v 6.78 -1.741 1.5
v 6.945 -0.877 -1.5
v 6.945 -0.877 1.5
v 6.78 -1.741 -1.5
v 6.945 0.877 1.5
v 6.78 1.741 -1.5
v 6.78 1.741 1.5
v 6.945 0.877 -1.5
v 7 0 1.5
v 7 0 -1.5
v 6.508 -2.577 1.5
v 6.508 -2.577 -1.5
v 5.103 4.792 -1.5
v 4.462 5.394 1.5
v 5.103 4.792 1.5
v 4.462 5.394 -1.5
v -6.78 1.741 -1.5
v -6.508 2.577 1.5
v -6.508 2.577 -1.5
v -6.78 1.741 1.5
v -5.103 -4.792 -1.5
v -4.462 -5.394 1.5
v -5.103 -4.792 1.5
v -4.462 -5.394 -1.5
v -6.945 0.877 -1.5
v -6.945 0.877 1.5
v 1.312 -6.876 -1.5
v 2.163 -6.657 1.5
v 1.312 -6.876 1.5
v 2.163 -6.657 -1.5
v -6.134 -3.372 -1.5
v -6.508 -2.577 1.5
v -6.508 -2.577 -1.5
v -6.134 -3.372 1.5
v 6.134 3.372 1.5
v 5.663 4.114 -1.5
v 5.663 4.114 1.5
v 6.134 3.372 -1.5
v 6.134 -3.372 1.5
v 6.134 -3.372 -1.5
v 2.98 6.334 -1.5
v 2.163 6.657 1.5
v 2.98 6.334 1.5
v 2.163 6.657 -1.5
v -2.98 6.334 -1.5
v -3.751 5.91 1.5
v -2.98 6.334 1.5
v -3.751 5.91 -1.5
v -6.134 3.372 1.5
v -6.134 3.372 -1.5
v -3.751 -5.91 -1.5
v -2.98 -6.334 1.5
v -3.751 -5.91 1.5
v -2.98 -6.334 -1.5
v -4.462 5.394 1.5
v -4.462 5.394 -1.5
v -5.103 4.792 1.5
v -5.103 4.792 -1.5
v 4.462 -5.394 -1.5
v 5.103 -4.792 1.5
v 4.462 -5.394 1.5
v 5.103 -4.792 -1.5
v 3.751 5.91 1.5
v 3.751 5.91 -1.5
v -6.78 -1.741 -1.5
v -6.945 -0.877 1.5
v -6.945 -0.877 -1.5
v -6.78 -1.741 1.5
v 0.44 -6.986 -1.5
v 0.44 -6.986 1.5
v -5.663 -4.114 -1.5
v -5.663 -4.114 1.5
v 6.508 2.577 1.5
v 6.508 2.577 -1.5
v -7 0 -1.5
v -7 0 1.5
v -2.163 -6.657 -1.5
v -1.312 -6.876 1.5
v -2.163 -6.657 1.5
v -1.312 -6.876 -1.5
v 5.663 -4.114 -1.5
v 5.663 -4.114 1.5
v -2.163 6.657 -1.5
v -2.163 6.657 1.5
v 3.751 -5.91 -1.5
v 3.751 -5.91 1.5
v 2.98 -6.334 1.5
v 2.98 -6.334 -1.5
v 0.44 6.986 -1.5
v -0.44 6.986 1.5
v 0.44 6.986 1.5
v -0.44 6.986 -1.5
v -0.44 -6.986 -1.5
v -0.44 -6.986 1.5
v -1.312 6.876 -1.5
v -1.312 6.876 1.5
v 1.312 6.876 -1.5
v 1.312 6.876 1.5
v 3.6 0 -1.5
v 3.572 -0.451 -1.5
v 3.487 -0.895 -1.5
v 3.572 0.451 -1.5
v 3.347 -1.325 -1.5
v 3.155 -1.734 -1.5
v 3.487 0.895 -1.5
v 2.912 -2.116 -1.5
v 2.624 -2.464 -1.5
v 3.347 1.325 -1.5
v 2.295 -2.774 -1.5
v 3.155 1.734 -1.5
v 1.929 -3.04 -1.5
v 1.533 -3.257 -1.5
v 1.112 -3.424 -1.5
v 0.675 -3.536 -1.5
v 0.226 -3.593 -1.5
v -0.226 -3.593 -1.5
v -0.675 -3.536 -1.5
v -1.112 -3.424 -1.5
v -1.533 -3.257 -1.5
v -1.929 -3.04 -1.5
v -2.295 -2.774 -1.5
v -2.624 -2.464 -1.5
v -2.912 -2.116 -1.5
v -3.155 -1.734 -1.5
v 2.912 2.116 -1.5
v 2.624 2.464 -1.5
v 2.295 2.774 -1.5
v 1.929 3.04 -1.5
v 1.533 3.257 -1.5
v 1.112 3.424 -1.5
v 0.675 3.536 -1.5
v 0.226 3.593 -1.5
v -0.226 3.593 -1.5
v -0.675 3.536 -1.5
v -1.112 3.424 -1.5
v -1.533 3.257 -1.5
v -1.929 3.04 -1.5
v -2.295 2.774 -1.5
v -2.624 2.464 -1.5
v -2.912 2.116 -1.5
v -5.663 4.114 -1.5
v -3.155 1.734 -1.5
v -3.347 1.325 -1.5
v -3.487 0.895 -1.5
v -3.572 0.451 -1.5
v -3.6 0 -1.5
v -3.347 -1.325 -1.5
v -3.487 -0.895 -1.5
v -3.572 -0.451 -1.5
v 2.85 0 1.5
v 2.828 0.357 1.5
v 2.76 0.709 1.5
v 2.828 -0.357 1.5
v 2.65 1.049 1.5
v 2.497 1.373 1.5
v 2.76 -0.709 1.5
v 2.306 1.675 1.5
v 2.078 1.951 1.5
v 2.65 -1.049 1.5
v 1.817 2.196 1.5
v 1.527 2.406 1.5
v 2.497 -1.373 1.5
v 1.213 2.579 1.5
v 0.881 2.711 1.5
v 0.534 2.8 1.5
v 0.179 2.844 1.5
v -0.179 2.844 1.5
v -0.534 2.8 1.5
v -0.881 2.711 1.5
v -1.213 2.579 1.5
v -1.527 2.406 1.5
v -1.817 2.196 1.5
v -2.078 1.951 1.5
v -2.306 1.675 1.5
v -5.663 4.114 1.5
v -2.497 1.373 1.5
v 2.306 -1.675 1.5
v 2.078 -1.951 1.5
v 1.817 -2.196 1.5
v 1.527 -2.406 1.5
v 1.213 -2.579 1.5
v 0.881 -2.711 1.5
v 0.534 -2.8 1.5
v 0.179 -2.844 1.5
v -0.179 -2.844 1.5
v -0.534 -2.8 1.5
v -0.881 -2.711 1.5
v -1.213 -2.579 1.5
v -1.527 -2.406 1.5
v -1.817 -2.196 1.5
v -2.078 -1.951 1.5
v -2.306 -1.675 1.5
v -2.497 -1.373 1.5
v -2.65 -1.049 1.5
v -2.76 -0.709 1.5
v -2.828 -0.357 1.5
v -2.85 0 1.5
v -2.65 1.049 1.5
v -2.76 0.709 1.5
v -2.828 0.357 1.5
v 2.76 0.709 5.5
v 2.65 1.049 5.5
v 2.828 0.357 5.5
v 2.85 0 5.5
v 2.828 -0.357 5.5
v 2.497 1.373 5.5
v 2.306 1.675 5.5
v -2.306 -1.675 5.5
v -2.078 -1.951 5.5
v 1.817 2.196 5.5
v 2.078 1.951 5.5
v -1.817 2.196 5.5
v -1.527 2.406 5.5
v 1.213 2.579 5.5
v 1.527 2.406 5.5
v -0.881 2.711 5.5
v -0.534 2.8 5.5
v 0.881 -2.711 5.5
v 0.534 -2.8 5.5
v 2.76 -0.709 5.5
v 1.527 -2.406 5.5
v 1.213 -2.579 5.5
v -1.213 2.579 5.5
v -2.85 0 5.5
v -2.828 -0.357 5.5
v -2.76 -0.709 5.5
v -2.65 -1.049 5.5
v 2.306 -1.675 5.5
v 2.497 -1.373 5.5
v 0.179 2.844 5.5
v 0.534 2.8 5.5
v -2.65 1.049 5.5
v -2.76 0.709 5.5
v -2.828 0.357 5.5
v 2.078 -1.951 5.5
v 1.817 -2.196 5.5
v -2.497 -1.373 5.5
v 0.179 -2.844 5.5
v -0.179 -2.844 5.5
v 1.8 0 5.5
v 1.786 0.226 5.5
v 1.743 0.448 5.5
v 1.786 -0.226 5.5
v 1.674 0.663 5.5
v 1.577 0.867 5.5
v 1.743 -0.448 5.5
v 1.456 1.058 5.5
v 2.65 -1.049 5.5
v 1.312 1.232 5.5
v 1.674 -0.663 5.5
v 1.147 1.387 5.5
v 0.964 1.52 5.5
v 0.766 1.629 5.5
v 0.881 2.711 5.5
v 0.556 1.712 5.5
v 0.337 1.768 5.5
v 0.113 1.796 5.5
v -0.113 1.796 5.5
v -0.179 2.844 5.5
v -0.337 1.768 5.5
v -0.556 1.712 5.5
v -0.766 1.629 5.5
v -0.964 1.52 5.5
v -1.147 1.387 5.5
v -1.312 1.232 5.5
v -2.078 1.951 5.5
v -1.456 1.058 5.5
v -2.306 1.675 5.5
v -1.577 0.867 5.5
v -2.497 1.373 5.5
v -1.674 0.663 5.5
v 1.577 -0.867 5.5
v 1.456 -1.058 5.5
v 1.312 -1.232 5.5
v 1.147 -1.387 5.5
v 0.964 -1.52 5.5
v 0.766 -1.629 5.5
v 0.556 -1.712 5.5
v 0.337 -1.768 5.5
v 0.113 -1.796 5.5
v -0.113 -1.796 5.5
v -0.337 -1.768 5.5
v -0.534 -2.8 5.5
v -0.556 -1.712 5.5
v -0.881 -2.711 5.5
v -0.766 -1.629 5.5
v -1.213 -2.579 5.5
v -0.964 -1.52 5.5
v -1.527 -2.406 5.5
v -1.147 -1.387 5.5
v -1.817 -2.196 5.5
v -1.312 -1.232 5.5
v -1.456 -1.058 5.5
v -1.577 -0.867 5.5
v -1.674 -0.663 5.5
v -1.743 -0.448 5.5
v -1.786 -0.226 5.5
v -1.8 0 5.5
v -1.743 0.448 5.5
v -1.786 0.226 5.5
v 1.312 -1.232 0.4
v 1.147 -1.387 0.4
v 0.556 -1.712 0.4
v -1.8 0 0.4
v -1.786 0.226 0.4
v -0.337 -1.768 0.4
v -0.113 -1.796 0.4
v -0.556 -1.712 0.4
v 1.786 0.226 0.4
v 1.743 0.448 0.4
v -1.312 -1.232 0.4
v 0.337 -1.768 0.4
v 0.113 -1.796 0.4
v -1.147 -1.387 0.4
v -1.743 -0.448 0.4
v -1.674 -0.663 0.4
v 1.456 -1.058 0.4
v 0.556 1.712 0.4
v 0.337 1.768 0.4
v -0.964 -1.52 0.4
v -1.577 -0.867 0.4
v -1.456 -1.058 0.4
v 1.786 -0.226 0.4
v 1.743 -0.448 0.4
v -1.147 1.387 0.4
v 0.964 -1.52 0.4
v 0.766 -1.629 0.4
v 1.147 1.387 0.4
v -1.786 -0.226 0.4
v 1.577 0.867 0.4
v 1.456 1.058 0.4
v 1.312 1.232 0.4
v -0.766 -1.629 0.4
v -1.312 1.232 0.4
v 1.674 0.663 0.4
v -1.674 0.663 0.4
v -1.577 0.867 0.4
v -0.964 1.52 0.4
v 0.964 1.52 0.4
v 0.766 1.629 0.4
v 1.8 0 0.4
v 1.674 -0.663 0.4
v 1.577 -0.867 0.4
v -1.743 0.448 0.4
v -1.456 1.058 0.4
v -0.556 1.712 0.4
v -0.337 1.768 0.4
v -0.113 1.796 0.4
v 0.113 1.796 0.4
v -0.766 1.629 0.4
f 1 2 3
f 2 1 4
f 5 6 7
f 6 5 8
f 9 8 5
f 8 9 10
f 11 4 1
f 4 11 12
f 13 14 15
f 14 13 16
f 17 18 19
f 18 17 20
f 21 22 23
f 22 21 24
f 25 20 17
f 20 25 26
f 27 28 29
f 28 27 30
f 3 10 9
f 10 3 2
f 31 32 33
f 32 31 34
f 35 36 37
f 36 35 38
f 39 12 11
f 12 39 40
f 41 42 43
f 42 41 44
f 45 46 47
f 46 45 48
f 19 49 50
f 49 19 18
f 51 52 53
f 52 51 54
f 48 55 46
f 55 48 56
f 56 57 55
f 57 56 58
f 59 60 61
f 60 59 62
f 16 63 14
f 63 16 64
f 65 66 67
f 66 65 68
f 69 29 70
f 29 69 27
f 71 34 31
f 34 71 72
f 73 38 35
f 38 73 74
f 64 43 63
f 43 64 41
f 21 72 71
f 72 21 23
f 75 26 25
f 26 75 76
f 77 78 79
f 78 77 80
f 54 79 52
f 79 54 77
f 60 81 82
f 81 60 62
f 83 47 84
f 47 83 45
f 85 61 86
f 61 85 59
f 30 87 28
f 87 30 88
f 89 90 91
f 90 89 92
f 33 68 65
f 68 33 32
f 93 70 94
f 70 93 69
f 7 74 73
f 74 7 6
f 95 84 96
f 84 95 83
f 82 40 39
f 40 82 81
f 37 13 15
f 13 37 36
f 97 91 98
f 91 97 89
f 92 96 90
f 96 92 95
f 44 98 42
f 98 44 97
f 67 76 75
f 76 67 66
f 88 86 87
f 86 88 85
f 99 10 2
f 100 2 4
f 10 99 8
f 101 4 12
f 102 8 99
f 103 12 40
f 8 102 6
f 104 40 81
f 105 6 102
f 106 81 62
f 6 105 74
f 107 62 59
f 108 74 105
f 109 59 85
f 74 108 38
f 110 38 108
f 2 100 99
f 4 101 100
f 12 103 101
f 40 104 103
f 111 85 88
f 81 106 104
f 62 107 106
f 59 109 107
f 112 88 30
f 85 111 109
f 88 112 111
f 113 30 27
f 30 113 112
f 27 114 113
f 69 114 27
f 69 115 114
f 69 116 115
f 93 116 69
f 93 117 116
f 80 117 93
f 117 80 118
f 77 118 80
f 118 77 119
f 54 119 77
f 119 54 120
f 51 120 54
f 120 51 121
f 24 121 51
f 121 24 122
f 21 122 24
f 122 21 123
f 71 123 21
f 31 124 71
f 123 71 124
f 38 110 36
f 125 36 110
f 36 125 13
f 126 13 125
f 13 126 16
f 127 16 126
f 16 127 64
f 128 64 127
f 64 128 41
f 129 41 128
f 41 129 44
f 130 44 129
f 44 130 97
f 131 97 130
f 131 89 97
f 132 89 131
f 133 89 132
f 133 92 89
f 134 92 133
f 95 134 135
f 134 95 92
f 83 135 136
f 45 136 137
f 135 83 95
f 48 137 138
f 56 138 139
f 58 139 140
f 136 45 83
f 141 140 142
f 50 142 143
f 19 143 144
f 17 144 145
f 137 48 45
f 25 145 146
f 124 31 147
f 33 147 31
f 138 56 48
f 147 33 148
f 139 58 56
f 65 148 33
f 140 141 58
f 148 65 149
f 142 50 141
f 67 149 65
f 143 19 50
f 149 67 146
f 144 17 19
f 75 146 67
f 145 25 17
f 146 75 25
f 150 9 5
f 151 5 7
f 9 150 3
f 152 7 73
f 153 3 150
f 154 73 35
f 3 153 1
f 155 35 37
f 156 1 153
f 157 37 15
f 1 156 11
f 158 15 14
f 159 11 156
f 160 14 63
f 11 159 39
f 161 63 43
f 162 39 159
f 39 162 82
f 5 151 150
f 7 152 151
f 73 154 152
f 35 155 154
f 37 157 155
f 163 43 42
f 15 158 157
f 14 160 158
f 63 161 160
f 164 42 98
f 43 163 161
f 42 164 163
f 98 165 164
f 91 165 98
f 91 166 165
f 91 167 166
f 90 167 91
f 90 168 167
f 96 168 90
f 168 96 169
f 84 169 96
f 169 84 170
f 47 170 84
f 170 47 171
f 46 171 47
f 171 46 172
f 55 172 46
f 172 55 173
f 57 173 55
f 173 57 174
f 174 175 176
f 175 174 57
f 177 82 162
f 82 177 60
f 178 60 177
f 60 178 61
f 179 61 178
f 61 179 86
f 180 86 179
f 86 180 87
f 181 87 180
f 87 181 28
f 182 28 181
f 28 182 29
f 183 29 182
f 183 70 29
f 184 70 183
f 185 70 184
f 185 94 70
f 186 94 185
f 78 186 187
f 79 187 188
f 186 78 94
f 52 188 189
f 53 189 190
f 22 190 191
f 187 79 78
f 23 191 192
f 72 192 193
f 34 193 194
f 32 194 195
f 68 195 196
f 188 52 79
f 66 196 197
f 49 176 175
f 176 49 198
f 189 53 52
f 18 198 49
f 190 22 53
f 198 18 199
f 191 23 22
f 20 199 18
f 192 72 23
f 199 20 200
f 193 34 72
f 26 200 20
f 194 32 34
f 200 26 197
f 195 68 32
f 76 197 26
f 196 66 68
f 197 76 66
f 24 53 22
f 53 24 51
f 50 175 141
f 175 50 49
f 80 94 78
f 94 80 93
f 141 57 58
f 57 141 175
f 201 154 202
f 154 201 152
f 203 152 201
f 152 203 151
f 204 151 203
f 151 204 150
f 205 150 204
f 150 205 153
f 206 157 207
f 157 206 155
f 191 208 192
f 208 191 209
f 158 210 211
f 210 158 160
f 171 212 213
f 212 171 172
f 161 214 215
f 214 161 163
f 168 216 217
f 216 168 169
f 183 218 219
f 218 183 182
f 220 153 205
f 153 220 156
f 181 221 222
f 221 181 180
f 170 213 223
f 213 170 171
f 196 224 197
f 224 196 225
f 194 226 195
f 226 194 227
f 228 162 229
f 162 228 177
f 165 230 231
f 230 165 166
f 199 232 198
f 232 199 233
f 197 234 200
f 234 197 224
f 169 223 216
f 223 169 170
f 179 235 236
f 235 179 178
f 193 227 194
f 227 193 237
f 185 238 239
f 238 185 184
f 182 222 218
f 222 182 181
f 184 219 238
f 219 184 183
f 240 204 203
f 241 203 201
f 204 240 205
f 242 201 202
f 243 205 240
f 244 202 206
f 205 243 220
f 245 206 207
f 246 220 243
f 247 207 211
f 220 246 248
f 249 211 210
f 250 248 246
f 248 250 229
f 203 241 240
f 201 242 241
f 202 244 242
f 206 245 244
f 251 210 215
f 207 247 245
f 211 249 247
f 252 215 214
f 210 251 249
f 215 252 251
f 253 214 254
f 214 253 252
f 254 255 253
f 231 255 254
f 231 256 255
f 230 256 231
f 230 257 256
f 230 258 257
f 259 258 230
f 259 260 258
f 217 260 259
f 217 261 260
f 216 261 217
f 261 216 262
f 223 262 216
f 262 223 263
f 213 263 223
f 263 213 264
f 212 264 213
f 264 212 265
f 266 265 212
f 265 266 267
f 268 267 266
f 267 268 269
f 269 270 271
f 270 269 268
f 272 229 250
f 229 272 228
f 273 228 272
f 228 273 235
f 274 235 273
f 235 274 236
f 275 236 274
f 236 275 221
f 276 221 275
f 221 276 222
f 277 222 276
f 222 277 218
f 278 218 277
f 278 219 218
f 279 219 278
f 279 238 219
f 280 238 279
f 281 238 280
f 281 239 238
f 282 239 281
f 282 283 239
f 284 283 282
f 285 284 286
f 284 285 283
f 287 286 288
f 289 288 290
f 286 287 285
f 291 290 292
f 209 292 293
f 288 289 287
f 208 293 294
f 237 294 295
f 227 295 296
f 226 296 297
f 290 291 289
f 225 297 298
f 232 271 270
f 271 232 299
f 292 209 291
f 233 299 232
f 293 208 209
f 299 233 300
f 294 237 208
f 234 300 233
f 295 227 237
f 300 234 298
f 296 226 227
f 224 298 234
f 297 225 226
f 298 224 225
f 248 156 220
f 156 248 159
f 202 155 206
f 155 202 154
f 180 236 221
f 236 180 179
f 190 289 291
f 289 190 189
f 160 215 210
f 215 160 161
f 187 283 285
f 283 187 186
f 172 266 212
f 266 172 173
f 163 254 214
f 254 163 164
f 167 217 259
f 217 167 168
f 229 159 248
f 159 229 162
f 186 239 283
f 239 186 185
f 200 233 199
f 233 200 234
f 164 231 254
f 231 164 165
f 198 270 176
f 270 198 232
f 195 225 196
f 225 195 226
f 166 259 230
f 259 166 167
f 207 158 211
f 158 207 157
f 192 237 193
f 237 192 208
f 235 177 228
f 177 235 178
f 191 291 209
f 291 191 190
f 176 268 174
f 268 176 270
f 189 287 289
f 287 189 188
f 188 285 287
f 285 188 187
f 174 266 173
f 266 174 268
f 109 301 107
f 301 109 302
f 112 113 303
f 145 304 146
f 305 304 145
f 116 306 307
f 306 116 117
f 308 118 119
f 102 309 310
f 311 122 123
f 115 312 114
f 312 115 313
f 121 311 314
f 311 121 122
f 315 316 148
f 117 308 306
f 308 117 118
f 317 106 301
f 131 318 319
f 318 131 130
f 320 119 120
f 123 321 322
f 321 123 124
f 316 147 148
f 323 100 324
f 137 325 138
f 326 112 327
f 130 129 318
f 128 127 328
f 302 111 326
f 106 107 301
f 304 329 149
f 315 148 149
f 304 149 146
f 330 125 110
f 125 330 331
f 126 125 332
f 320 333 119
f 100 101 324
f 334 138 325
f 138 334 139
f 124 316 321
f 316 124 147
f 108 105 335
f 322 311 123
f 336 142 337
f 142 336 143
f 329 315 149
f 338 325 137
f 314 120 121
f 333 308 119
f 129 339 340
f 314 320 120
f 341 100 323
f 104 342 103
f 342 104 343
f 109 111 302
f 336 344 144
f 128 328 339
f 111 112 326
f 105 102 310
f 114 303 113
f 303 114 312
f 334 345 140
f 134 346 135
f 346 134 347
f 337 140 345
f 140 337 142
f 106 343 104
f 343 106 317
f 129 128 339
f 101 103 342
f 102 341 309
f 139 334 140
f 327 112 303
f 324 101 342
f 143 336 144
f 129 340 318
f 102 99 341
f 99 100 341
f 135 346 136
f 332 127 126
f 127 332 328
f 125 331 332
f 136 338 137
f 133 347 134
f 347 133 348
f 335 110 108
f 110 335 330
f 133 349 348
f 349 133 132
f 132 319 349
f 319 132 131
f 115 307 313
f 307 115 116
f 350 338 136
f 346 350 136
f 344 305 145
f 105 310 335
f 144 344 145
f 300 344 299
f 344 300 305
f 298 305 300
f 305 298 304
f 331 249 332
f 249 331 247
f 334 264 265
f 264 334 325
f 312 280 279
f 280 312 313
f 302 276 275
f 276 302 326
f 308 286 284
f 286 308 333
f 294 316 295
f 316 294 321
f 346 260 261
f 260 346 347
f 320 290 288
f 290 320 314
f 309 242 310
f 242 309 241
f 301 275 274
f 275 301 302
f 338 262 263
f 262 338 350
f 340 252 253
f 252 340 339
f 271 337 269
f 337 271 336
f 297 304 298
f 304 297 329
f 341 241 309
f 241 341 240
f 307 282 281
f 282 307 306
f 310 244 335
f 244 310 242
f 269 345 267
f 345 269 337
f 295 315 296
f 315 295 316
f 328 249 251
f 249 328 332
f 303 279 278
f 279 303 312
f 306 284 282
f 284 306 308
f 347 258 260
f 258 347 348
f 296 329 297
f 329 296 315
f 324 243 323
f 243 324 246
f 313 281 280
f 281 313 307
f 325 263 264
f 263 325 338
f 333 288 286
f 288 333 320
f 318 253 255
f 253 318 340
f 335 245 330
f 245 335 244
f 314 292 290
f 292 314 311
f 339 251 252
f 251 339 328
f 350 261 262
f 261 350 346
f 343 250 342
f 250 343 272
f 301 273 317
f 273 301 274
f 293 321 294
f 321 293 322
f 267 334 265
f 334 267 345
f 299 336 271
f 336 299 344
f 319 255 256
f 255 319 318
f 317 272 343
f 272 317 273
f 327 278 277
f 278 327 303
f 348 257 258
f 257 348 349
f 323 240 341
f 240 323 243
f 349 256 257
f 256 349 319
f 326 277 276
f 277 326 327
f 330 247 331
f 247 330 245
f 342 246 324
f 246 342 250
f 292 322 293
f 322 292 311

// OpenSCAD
$fn = 50;


difference() {
	union() {
		translate(v = [0, 0, -1.5000000000]) {
			cylinder(h = 3, r = 7.0000000000);
		}
		translate(v = [0, 0, -1.5000000000]) {
			cylinder(h = 7, r = 2.8500000000);
		}
	}
	union() {
		translate(v = [0, 0, -1.5000000000]) {
			rotate(a = [0, 180, 0]) {
				difference() {
					union() {
						translate(v = [0, 0, -7.0000000000]) {
							cylinder(h = 7, r = 1.5000000000);
						}
						translate(v = [0, 0, -1.9000000000]) {
							cylinder(h = 1.9000000000, r1 = 1.8000000000, r2 = 3.6000000000);
						}
						translate(v = [0, 0, -7.0000000000]) {
							cylinder(h = 7, r = 1.8000000000);
						}
						translate(v = [0, 0, -7.0000000000]) {
							cylinder(h = 7, r = 1.5000000000);
						}
					}
					union();
				}
			}
		}
		translate(v = [0, 0, -50.0000000000]) {
			cylinder(h = 100, r = 1.8000000000);
		}
	}
}
